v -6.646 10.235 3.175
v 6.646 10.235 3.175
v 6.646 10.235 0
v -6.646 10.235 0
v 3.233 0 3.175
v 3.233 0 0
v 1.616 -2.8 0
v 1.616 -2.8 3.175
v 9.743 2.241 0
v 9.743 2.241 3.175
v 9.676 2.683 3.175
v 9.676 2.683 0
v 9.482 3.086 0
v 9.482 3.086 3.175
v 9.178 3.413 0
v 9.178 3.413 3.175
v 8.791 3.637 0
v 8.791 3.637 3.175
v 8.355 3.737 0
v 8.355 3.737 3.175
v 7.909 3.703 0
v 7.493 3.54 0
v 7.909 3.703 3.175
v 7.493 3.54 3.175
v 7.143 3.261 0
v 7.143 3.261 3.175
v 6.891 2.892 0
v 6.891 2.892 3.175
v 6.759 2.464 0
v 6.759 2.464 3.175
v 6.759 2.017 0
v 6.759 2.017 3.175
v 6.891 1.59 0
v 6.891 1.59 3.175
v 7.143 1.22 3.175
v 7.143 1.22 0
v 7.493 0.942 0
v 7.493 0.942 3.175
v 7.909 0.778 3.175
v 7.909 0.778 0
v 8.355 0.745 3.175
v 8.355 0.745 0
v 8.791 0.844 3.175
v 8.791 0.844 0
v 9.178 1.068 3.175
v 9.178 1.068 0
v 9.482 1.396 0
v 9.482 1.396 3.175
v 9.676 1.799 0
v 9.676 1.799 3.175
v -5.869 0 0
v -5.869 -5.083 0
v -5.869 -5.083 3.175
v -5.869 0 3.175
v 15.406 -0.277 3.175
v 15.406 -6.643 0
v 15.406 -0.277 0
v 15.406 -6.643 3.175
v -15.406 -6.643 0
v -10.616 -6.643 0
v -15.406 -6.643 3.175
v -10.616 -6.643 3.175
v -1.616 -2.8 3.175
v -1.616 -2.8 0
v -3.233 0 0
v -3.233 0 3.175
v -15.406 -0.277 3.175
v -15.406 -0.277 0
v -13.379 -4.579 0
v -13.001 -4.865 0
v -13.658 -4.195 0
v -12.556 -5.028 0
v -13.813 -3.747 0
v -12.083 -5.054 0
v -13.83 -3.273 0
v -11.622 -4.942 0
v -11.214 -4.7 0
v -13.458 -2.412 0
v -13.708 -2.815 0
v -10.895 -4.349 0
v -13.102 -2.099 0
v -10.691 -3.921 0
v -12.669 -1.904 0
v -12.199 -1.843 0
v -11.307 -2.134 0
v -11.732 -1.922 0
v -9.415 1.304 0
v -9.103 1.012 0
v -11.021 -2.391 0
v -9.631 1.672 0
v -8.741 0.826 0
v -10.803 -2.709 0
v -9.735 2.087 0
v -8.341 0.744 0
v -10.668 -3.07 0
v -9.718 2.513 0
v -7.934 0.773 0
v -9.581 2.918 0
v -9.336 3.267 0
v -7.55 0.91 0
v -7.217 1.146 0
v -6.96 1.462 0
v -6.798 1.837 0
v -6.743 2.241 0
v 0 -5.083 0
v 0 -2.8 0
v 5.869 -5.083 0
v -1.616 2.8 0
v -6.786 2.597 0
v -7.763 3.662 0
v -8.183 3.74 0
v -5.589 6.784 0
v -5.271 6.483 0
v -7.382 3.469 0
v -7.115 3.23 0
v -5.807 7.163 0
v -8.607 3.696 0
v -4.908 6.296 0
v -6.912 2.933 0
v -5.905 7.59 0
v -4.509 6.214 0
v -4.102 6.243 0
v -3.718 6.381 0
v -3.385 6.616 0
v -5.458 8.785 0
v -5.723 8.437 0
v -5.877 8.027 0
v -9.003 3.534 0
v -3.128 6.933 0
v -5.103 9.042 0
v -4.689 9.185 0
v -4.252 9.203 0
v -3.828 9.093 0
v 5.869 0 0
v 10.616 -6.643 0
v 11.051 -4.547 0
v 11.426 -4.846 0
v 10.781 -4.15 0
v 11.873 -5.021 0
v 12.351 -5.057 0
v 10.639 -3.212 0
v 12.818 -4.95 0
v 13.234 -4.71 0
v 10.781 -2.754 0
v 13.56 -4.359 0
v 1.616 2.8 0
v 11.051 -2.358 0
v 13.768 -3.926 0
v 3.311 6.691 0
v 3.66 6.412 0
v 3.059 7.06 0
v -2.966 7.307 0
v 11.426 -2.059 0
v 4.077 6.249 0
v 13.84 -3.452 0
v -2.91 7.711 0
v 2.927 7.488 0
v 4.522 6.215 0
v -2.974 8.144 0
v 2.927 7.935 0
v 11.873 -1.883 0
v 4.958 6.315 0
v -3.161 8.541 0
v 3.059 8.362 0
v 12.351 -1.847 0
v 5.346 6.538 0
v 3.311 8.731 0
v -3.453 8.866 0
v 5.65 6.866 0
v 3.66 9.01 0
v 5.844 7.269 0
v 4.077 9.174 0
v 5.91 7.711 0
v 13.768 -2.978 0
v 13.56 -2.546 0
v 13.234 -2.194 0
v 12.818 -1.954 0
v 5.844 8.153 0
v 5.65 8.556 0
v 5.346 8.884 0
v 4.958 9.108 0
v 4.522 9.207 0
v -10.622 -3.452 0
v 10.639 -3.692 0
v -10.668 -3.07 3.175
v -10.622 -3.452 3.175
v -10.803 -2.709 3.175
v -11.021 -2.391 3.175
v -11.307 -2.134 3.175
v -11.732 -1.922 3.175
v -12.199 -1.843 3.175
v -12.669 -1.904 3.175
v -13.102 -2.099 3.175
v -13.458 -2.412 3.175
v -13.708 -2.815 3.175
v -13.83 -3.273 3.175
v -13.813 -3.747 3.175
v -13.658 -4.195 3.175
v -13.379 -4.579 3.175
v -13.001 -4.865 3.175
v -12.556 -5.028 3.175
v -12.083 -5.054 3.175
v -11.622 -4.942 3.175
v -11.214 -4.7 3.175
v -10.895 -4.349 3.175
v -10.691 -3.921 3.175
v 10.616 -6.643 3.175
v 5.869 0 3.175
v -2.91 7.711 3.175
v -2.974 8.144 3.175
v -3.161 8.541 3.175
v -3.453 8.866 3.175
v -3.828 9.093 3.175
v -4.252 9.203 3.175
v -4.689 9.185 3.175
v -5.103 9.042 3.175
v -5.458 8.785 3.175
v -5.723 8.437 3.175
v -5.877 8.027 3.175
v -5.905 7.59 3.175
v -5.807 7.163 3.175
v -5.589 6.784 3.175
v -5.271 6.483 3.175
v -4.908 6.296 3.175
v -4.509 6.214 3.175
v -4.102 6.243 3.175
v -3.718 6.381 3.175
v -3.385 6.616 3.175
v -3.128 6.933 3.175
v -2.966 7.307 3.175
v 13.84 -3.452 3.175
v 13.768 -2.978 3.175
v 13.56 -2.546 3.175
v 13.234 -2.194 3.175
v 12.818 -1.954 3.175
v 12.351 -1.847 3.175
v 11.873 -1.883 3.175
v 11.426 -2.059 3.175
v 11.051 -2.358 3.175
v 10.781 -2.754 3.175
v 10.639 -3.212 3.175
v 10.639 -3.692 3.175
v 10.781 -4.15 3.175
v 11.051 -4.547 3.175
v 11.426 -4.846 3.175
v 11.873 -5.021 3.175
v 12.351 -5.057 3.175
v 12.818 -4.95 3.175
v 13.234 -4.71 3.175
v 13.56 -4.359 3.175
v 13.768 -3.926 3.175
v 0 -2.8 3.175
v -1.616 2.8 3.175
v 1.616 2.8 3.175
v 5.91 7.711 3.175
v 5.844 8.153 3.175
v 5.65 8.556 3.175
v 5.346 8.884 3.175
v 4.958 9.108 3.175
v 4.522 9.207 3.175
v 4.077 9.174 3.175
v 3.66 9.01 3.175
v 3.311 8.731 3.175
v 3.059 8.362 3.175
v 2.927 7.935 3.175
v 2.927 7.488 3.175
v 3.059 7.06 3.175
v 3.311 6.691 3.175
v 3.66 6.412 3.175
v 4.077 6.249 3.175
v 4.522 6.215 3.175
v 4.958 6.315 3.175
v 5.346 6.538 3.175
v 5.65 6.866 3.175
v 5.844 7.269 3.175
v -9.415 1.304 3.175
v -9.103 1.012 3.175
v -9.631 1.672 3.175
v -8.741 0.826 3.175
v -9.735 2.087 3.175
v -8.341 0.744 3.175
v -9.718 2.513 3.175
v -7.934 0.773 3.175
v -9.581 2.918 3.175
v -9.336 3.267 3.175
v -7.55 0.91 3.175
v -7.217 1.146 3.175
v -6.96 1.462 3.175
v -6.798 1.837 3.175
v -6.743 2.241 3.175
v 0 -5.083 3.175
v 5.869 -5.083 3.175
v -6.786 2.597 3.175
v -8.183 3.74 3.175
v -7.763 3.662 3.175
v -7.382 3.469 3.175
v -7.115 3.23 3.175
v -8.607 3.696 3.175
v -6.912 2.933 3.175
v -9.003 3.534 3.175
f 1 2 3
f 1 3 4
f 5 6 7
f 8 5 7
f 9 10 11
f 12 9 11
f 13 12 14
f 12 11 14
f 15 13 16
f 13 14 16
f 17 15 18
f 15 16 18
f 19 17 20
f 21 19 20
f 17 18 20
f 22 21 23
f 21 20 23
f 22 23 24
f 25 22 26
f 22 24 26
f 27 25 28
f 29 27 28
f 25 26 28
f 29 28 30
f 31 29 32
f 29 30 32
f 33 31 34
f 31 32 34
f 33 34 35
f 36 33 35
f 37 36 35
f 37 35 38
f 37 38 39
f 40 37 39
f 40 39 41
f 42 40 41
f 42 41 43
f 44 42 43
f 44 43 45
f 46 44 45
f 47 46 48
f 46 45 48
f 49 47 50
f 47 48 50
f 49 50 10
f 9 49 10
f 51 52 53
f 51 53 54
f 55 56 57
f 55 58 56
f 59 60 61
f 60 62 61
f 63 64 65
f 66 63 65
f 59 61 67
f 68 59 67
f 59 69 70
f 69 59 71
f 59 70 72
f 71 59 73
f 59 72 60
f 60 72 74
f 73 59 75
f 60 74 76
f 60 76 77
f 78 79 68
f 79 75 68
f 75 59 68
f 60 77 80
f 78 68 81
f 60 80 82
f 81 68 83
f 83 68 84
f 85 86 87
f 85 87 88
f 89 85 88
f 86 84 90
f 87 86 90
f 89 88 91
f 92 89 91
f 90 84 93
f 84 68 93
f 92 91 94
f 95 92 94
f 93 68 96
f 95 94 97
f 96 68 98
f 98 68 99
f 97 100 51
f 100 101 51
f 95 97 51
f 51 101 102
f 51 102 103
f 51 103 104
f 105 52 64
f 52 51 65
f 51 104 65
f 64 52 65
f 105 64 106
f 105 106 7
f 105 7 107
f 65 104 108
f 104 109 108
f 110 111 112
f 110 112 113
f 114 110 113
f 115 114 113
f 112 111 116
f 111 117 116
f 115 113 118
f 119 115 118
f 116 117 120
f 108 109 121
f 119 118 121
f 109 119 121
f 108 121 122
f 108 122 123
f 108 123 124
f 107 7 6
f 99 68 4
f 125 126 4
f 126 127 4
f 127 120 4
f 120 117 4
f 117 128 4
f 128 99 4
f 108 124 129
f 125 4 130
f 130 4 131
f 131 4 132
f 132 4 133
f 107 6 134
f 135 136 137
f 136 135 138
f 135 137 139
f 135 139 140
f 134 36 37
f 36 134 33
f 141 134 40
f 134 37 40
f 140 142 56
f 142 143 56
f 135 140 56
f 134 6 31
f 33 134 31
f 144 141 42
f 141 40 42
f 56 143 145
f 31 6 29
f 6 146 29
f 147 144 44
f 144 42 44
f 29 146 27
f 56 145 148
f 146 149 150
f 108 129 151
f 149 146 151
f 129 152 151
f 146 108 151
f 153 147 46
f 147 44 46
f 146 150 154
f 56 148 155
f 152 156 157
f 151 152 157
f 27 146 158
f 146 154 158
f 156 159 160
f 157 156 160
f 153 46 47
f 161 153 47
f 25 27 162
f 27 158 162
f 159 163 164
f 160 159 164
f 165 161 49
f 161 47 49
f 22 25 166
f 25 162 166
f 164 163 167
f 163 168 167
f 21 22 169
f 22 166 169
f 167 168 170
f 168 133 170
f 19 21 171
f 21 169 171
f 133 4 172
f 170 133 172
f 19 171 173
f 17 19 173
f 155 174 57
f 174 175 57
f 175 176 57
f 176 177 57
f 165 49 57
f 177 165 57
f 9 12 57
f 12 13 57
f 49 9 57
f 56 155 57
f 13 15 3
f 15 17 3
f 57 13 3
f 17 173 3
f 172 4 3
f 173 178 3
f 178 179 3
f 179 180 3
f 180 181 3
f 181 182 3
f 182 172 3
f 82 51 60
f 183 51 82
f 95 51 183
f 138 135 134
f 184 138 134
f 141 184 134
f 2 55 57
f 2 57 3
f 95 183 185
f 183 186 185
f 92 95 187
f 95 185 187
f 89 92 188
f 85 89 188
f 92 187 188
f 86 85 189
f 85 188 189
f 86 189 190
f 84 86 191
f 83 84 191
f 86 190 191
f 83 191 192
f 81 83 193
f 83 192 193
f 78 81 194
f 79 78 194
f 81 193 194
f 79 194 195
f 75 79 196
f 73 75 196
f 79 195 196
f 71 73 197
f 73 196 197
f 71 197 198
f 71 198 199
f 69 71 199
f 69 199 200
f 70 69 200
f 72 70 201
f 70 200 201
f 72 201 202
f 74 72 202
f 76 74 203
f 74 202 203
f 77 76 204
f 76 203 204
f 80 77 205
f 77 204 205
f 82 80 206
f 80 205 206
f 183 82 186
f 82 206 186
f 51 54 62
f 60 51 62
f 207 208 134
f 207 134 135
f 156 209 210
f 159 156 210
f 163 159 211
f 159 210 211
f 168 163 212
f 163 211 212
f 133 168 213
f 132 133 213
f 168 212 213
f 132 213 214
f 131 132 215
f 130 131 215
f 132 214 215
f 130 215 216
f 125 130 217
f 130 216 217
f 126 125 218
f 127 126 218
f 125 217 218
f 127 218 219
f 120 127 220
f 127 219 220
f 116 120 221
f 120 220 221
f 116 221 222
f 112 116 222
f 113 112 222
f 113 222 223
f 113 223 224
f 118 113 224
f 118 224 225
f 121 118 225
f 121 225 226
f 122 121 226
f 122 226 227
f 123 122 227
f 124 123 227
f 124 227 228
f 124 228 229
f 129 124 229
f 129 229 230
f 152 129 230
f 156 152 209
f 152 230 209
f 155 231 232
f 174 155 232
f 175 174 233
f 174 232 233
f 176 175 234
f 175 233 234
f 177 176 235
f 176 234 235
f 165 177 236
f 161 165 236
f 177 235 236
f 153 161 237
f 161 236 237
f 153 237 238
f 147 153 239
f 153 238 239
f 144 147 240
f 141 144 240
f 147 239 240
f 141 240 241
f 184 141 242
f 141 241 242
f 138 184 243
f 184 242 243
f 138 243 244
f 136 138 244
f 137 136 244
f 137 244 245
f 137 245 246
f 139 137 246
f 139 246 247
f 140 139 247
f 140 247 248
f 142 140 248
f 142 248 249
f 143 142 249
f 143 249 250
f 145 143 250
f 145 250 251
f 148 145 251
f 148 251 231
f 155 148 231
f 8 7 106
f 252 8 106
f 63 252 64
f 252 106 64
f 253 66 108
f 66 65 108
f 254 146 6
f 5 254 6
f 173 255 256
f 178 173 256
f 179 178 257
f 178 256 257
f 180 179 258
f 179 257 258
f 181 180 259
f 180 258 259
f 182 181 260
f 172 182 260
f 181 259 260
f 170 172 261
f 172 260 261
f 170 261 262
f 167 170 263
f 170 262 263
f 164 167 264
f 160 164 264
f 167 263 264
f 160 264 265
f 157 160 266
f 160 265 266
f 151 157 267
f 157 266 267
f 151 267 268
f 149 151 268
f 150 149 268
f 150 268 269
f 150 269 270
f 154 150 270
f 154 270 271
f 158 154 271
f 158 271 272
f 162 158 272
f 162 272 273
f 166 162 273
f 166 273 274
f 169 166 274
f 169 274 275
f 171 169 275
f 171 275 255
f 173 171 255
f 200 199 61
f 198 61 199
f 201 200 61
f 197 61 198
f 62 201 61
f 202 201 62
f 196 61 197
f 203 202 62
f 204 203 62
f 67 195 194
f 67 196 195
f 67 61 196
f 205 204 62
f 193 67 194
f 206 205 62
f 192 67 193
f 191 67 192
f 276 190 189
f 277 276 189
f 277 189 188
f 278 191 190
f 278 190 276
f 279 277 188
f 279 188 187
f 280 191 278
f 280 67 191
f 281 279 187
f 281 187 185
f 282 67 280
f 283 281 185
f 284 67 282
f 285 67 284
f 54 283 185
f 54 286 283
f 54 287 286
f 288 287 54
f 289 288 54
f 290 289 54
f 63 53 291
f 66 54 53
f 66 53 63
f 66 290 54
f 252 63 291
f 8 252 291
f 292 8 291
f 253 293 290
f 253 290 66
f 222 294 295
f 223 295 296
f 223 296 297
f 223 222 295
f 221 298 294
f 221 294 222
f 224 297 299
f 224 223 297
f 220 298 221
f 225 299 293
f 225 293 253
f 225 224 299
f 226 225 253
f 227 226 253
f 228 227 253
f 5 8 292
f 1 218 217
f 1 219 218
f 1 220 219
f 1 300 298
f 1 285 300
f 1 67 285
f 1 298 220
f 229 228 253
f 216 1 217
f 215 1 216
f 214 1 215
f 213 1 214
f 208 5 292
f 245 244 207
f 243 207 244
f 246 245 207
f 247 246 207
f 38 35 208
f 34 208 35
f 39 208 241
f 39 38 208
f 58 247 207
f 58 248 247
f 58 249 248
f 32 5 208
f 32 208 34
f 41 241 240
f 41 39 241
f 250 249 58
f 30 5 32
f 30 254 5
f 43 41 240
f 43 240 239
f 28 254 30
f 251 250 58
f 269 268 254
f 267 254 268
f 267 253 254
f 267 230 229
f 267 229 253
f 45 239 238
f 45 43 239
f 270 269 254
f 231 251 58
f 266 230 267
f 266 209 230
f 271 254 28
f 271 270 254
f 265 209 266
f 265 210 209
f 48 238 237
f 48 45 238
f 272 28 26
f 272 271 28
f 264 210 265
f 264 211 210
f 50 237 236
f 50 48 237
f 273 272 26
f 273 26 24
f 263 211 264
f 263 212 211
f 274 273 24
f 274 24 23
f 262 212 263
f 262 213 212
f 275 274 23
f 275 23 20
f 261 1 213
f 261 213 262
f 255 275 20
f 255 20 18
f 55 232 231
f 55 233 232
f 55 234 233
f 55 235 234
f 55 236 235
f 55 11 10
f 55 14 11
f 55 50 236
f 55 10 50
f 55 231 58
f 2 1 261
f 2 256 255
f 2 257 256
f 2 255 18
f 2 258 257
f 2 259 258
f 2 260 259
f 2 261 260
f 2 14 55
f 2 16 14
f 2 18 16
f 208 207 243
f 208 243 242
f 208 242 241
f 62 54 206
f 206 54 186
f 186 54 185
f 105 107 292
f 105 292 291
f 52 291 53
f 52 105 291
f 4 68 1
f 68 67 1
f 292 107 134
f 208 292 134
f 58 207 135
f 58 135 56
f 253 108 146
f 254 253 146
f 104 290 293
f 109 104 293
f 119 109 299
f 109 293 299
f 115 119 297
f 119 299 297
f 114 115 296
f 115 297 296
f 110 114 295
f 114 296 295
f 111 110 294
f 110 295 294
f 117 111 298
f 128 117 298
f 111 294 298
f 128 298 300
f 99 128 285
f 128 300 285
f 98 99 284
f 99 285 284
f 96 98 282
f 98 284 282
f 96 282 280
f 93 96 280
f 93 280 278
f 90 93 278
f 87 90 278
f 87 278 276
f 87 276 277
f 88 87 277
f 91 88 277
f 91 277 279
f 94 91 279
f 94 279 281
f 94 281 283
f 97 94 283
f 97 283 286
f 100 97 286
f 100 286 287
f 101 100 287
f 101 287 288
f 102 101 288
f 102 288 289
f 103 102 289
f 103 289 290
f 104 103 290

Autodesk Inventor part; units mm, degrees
ref_plane "YZ Plane" through (0, 0, 0) normal (1, 0, 0) x (0, 1, 0)
sketch "Sketch1" plane through (0, 0, 0) normal (0, 0, 1) x (1, 0, 0)
  circle A0 centre (0, 0) radius 2.2479
  circle A1 centre (-1.3525, -2.3427) radius 0.4572
  circle A2 centre (1.3526, -2.3427) radius 0.4572
  circle A3 centre (2.7051, 0) radius 0.4572
  circle A4 centre (1.3525, 2.3427) radius 0.4572
  circle A5 centre (-1.3525, 2.3427) radius 0.4572
  circle A6 centre (-2.7051, 0) radius 0.4572
  line L0 (-1.6165, -2.7999) -> (-3.233, 0)
  line L1 (-3.233, 0) -> (-1.6165, 2.7999)
  line L2 (-1.6165, 2.7999) -> (1.6165, 2.7999)
  line L3 (1.6165, 2.7999) -> (3.233, 0)
  line L4 (3.233, 0) -> (1.6165, -2.7999)
  line L5 (1.6165, -2.7999) -> (-1.6165, -2.7999)
  line L6 (0, 0) -> (0, -5.0828)
  line L7 (-5.8691, 0) -> (-2.9345, 5.0828)
  line L8 (-2.9345, 5.0828) -> (2.9345, 5.0828)
  line L9 (2.9345, 5.0828) -> (5.8691, 0)
  line L10 (2.9345, -5.0828) -> (-2.9345, -5.0828)
  line L11 (-2.9345, -5.0828) -> (-5.8691, -5.0828)
  line L12 (-5.8691, -5.0828) -> (-5.8691, 0)
  line L13 (2.9345, -5.0828) -> (5.8691, -5.0828)
  line L14 (5.8691, -5.0828) -> (5.8691, 0)
  point P0 (0, -2.2479)
  dimension "d0" = 4.4958
  dimension "d4" = 360
extrude "Extrusion1" add sketch "Sketch1" along normal blind 3.175
sketch "Sketch2" plane through (0, 0, 3.175) normal (0, 0, 1) x (1, 0, 0)
  line L0 (2.9345, 5.0828) -> (-2.9345, 5.0828) projected
  circle A0 centre (-8.2426, 2.2407) radius 1.5
  circle A1 centre (-4.4104, 7.7112) radius 1.5
  circle A2 centre (-12.2306, -3.4521) radius 1.6091
  line L1 (0, -1.718) -> (0, 5.1689)
  circle A3 centre (8.2426, 2.2407) radius 1.5
  circle A4 centre (12.2306, -3.4521) radius 1.6091
  circle A5 centre (4.4104, 7.7112) radius 1.5
  line L2 (-5.8691, 0) -> (-10.6162, -6.6427)
  line L3 (-10.6162, -6.6427) -> (-15.4056, -6.6427)
  line L4 (-15.4056, -6.6427) -> (-15.4056, -0.2771)
  line L5 (-15.4056, -0.2771) -> (-6.6459, 10.2346)
  line L6 (-6.6459, 10.2346) -> (0, 10.2346)
  line L7 (5.8691, 0) -> (10.6162, -6.6427)
  line L8 (10.6162, -6.6427) -> (15.4056, -6.6427)
  line L9 (15.4056, -6.6427) -> (15.4056, -0.2771)
  line L10 (15.4056, -0.2771) -> (6.6459, 10.2346)
  line L11 (6.6459, 10.2346) -> (0, 10.2346)
  line L12 (5.8691, 0) -> (2.9345, 5.0828) projected
  line L13 (5.8691, 0) -> (2.9345, 5.0828)
  line L14 (2.9345, 5.0828) -> (-2.9345, 5.0828)
  line L15 (5.8691, 0) -> (2.9345, 5.0828)
  line L16 (-5.8691, 0) -> (-2.9345, 5.0828)
  line L17 (-4.4104, 7.7112) -> (-12.2306, -3.4521)
  point P0 (-2.9579, 5.0828)
  dimension "d28" = 3
  dimension "d29" = 3
  dimension "d30" = 9.144
ref_plane "Work Plane2" through (-2.9345, 5.0828, 0) normal (-0.866, -0.5, 0) x (0, 0, 1)
ref_plane "Work Plane3" through (0, 0, 1.5875) normal (0, 0, 1) x (1, 0, 0)
extrude "Extrusion4" add sketch "Sketch2" against normal blind 3.175
properties part number "WireGuideBoltHols"
